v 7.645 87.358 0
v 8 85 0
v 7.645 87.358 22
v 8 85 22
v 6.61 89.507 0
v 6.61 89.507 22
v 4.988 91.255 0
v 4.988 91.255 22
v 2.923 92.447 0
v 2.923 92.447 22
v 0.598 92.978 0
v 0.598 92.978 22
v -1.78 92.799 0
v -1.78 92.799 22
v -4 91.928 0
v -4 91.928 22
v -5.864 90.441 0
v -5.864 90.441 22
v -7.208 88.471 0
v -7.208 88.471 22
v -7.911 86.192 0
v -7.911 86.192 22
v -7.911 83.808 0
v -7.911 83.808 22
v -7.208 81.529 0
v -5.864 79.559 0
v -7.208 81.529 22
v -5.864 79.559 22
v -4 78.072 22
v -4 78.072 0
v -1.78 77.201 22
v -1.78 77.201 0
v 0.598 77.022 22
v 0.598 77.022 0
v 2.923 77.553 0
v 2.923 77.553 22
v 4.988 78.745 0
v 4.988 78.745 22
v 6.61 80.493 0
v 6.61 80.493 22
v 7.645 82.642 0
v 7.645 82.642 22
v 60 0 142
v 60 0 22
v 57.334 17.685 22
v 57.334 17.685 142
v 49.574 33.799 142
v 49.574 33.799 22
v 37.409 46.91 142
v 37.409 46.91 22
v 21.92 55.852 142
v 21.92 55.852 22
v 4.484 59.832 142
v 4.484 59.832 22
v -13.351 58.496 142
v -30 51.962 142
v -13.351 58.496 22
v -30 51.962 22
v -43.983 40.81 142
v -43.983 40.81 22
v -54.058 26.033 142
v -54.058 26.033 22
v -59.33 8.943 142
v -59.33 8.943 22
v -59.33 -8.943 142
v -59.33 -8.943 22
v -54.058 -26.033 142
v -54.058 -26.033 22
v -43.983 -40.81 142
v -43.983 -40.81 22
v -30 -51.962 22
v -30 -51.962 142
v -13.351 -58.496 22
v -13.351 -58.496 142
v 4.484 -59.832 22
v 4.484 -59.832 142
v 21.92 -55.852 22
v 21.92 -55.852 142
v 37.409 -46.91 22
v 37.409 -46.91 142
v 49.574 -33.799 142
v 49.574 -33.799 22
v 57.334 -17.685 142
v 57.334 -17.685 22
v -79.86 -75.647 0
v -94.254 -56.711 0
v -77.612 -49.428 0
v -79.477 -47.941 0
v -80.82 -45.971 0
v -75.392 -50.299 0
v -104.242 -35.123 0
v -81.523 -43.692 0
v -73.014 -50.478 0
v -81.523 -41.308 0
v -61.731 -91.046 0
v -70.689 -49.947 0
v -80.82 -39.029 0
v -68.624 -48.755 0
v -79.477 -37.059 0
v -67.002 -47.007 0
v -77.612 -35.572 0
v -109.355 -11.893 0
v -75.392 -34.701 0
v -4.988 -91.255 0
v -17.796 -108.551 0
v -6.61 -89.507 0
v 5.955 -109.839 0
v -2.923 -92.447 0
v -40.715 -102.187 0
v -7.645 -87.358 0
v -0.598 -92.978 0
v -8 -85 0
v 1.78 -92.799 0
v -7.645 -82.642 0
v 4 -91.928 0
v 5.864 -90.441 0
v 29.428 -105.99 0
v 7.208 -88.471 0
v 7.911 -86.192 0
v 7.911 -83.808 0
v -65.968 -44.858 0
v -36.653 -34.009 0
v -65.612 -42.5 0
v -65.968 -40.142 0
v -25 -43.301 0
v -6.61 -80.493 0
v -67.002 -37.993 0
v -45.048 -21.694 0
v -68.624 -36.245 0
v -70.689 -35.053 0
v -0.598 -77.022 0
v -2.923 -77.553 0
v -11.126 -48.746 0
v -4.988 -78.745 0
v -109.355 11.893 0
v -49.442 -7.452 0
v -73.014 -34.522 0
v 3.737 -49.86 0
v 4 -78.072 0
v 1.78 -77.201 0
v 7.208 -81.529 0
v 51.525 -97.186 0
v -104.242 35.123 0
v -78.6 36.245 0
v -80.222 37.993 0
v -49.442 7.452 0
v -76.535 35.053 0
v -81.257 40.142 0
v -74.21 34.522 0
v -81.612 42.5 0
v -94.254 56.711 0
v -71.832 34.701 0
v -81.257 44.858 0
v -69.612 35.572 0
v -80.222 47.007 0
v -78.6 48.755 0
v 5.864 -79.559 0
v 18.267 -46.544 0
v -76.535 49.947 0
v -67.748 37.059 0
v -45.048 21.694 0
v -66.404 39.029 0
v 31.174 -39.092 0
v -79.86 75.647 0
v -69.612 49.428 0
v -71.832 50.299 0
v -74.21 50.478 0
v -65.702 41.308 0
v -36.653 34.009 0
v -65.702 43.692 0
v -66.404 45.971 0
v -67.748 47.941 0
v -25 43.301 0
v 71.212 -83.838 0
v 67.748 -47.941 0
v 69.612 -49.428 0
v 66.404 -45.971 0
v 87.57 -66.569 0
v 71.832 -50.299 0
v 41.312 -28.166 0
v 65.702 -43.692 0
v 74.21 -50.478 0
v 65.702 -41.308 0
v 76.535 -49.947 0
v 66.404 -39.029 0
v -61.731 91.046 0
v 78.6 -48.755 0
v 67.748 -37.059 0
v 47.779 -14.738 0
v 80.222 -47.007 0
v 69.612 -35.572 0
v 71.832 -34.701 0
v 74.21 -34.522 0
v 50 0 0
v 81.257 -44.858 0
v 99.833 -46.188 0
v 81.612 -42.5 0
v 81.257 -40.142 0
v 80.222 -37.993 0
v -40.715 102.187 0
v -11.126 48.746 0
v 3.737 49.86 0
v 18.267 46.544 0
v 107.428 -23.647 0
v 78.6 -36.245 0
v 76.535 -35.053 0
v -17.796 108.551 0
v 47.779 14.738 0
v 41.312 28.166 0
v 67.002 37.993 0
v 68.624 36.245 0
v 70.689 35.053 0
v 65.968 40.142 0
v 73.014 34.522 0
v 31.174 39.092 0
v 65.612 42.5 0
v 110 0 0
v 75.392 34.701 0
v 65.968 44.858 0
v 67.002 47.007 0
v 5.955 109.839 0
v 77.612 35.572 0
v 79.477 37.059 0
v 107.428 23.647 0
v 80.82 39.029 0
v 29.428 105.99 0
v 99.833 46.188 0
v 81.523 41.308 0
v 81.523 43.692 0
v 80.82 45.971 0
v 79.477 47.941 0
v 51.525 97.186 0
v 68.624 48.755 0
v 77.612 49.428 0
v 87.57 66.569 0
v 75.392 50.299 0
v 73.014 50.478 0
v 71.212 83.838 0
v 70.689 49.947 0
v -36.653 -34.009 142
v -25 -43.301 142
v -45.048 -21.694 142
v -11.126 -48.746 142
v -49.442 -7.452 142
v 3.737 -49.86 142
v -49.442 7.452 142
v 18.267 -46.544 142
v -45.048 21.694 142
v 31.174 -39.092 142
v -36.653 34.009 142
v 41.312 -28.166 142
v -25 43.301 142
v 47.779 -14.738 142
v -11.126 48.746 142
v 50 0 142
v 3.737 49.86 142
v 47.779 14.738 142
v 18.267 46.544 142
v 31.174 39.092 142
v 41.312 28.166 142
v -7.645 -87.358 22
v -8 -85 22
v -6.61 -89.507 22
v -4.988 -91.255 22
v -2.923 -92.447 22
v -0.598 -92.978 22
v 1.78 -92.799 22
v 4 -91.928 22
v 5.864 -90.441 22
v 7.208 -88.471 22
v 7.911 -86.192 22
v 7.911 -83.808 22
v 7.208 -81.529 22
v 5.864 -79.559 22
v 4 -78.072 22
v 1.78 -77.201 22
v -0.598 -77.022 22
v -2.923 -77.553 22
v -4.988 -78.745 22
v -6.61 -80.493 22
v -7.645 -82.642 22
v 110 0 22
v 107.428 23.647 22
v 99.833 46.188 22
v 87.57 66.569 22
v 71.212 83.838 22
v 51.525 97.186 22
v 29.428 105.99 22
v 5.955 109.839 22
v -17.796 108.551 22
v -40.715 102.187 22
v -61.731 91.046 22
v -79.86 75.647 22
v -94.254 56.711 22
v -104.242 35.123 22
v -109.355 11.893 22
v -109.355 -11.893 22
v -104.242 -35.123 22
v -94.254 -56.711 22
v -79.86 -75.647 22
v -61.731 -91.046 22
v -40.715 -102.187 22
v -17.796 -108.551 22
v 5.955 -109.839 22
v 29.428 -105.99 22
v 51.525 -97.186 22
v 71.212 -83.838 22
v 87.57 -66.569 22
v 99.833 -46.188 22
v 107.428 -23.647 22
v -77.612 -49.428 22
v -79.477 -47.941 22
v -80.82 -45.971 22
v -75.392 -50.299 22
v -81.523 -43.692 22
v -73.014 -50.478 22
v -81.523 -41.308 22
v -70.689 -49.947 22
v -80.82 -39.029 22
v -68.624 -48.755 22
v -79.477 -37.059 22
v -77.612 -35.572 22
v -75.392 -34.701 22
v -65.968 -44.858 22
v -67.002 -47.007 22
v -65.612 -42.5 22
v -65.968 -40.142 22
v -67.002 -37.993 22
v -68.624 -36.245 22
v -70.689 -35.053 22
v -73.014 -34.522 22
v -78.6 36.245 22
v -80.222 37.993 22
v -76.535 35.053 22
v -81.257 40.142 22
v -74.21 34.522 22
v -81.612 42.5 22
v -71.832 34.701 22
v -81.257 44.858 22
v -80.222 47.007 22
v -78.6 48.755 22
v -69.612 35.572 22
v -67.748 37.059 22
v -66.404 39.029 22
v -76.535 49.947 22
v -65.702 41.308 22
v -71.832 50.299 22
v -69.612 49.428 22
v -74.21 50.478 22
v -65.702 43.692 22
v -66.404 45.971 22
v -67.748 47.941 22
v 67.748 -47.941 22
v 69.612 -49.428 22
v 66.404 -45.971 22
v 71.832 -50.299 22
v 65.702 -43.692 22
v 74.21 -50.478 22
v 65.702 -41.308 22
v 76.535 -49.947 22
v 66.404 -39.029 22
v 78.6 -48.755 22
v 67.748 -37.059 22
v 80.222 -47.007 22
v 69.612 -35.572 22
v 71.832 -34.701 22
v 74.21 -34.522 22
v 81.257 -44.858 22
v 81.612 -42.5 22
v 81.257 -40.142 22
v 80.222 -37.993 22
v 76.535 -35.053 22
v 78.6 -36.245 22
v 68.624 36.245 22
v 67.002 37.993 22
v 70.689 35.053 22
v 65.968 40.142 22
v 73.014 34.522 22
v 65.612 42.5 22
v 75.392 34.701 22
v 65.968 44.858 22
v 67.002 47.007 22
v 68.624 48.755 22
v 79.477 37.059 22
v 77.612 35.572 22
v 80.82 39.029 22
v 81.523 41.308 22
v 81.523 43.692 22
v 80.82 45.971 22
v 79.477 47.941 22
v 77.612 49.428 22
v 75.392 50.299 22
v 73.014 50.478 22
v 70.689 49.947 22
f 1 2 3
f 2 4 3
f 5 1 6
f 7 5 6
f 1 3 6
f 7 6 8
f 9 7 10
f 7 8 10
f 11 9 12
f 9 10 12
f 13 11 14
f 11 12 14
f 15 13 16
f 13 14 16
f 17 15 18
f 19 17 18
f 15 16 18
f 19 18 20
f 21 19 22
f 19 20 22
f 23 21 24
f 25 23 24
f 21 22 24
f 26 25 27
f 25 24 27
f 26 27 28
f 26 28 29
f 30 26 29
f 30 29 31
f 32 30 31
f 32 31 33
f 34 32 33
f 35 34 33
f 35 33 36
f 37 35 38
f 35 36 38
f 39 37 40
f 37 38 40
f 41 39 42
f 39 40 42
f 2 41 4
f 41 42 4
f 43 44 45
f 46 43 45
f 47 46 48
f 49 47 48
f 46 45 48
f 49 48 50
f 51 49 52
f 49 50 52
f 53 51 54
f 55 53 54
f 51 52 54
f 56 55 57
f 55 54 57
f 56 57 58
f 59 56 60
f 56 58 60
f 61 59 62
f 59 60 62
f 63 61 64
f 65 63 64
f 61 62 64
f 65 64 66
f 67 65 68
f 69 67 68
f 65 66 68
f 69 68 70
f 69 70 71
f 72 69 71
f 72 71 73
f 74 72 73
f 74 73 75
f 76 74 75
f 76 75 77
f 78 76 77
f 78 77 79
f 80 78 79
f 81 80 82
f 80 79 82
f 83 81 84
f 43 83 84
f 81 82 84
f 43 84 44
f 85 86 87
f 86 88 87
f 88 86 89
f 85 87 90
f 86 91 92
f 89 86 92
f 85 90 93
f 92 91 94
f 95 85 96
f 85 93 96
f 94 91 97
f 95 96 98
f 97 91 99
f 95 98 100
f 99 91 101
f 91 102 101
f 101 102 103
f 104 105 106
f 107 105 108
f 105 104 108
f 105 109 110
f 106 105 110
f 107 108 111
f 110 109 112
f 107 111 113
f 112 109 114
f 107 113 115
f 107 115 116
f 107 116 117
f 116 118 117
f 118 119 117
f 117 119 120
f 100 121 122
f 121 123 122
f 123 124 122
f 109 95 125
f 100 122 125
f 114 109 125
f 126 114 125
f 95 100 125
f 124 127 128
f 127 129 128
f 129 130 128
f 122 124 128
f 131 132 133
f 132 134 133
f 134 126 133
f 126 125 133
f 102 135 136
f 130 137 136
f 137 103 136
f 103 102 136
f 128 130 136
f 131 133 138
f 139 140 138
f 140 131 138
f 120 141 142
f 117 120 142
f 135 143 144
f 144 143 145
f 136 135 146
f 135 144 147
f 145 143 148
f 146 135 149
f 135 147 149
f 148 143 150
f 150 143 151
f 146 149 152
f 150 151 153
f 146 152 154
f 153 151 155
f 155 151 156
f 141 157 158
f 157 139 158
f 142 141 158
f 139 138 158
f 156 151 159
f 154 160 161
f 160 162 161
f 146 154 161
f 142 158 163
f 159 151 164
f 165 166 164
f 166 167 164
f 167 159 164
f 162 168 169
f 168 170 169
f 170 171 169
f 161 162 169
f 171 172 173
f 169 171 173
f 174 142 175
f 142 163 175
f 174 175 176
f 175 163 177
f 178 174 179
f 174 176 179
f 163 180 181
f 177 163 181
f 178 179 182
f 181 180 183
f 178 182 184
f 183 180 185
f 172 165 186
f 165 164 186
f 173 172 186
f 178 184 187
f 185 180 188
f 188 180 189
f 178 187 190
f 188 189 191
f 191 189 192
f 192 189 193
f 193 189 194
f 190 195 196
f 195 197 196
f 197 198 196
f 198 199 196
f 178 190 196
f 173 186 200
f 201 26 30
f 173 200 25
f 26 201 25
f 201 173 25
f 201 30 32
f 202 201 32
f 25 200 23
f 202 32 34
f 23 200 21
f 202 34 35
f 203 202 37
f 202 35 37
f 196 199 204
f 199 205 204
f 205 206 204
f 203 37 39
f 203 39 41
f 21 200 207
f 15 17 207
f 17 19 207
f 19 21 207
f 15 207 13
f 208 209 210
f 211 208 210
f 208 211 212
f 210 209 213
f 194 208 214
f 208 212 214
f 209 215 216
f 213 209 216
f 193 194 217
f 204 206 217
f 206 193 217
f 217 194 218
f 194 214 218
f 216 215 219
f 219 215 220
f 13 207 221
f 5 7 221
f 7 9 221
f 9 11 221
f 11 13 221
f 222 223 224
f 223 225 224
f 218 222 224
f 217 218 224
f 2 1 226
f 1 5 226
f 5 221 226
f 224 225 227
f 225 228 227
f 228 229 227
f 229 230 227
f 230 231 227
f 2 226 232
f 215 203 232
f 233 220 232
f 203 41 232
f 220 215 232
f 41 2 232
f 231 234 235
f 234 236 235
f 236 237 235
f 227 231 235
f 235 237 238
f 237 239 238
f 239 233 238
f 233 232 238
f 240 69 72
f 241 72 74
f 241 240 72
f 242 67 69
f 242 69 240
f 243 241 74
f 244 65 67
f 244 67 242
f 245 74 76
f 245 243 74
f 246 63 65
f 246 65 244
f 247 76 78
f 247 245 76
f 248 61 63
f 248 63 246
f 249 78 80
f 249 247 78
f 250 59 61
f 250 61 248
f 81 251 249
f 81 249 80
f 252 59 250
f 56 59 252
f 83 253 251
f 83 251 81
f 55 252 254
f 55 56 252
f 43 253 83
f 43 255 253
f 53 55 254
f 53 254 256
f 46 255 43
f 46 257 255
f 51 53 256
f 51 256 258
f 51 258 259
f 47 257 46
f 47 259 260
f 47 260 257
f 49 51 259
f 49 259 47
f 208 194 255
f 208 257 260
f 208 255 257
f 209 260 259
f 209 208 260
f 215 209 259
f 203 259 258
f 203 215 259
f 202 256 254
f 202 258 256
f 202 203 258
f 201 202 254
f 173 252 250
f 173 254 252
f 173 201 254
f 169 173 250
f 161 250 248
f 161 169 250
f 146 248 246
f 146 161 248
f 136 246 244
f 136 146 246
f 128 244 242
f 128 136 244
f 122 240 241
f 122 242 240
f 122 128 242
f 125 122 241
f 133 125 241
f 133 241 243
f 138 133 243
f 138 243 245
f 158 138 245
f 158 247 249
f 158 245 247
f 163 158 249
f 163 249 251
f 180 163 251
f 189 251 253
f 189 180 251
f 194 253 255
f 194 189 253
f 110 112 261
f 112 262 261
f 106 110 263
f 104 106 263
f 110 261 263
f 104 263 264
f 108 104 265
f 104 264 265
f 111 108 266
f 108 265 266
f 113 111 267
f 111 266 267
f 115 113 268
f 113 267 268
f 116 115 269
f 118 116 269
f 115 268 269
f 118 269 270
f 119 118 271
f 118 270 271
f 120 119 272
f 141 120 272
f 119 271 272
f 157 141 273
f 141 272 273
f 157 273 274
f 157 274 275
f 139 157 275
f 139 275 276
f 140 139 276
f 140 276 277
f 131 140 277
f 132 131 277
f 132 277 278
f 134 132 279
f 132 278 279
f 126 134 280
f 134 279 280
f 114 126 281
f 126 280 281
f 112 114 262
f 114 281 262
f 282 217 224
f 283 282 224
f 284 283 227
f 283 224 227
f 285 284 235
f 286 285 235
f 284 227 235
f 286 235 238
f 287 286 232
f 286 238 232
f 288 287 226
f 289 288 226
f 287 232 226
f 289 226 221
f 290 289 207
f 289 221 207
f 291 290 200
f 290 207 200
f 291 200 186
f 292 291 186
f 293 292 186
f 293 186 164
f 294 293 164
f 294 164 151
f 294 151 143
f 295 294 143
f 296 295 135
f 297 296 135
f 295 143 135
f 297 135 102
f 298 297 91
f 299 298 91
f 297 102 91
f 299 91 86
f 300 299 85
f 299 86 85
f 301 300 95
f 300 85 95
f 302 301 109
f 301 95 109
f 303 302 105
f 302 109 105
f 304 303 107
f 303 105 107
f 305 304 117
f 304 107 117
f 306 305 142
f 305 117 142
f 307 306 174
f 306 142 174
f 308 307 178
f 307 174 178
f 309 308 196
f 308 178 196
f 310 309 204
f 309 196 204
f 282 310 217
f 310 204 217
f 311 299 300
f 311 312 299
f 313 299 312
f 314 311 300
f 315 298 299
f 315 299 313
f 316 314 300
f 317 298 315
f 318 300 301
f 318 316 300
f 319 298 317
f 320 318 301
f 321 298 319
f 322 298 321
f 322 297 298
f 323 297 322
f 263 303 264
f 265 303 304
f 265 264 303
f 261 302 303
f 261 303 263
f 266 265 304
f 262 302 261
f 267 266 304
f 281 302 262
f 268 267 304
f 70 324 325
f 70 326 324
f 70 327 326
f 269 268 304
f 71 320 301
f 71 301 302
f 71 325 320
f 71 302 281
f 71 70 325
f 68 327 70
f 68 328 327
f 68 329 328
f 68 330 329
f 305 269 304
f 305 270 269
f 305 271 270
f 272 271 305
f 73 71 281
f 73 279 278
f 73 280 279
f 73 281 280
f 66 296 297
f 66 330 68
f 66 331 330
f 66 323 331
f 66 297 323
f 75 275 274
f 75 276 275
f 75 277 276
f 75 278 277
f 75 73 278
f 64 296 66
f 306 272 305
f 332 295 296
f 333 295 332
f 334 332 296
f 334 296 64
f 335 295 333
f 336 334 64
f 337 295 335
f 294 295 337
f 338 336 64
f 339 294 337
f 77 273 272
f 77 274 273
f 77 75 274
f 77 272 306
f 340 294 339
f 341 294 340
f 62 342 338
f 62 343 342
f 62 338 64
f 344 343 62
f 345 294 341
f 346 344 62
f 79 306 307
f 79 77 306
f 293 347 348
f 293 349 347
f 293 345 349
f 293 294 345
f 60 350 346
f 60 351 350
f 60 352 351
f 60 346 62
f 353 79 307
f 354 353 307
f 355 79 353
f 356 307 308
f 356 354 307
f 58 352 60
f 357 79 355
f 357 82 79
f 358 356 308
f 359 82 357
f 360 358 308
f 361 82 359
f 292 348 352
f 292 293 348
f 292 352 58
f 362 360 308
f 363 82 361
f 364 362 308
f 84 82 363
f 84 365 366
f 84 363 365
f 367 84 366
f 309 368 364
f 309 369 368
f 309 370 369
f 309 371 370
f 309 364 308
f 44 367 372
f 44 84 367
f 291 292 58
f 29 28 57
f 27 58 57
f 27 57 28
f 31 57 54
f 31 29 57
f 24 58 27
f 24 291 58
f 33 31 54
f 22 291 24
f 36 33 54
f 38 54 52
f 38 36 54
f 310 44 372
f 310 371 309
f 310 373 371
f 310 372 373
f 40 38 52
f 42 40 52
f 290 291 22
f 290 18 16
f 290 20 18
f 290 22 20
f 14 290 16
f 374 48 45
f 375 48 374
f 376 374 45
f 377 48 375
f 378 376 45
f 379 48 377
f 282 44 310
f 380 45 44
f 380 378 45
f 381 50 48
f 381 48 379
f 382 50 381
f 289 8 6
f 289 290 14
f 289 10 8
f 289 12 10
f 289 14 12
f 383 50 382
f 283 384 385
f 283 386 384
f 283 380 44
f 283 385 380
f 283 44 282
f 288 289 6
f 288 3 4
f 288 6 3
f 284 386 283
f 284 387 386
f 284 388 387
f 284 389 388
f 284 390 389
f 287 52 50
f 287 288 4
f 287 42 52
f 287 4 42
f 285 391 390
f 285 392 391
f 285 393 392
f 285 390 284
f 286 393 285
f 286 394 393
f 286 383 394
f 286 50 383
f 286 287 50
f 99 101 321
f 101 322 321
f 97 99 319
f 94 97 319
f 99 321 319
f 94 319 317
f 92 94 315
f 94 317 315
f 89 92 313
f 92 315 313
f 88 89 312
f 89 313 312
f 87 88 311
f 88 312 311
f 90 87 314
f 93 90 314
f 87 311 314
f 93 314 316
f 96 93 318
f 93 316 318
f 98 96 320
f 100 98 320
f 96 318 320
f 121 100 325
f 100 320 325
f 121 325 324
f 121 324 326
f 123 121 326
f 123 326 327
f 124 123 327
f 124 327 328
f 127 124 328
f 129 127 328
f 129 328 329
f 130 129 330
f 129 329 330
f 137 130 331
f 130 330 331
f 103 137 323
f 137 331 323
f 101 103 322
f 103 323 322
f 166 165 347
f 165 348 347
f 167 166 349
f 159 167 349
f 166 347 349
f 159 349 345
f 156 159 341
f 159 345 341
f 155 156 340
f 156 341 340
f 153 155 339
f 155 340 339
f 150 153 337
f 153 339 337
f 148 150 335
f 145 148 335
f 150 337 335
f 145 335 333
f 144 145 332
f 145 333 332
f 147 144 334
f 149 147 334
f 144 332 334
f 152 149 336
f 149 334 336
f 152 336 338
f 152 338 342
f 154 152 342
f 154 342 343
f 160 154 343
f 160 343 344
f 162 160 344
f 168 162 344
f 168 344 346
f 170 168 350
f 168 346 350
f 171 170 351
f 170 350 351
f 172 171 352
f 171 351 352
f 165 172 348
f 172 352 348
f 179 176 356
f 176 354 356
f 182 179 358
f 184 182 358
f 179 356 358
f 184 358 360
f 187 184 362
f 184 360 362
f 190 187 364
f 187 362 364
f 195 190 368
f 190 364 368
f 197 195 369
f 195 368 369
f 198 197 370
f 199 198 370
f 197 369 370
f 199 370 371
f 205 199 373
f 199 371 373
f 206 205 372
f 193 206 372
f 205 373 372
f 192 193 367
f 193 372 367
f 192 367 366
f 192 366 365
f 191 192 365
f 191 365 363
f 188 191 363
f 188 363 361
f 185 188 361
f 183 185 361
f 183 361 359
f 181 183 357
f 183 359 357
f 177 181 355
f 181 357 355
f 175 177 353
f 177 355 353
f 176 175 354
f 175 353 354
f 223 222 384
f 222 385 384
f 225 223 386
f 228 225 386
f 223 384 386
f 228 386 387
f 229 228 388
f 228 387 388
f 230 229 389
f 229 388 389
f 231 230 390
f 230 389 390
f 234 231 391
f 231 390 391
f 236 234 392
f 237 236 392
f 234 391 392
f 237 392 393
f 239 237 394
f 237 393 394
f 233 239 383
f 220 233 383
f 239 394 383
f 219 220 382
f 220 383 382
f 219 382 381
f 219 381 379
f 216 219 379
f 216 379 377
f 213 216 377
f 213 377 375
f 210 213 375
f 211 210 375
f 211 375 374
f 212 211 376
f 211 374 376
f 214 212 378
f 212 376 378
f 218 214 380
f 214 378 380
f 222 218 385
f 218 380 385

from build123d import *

# Parameters (mm, degrees)
SKETCH1_R               = 110
BOSS_EXTRUDE2_DEPTH     = 22
SKETCH2_R               = 60
BOSS_EXTRUDE3_DEPTH     = 120
CUT_EXTRUDE1_DEPTH      = 211.627633515
CUT_EXTRUDE1_DEPTH_BACK = 211.627633515
SKETCH3_R               = 50
SKETCH4_R               = 8
CUT_EXTRUDE2_DEPTH      = 197.468827044
CIRPATTERN1_COUNT       = 6


with BuildPart() as part:
    # Sketch1 → Boss-Extrude2 (new body)
    with BuildSketch(Plane.XY):
        Circle(SKETCH1_R)
    extrude(amount=BOSS_EXTRUDE2_DEPTH)

    # Sketch2 → Boss-Extrude3 (add)
    with BuildSketch(Plane.XY.offset(22)):
        Circle(SKETCH2_R)
    extrude(amount=BOSS_EXTRUDE3_DEPTH)

    # Sketch3 → Cut-Extrude1 (cut, two sides: drawn at the far end of the back side and taken through both)
    with BuildSketch(Plane.XY.offset(142).offset(-CUT_EXTRUDE1_DEPTH_BACK)):
        Circle(SKETCH3_R)
    extrude(amount=CUT_EXTRUDE1_DEPTH + CUT_EXTRUDE1_DEPTH_BACK, mode=Mode.SUBTRACT)

    # Sketch4 → Cut-Extrude2 (cut, symmetric)
    with BuildSketch(Plane.XY.offset(22)):
        with Locations((0, 85)):
            Circle(SKETCH4_R)
    cut_extrude2 = extrude(amount=CUT_EXTRUDE2_DEPTH, both=True, mode=Mode.SUBTRACT)

    # CirPattern1: Cut-Extrude2 ×6 about axis
    cirpattern1_axis = Axis((0, 0, 0), (0, 0, 1))
    for i in range(1, CIRPATTERN1_COUNT):
        add(cut_extrude2.rotate(cirpattern1_axis, i * 360 / CIRPATTERN1_COUNT), mode=Mode.SUBTRACT)


solid = part.part
